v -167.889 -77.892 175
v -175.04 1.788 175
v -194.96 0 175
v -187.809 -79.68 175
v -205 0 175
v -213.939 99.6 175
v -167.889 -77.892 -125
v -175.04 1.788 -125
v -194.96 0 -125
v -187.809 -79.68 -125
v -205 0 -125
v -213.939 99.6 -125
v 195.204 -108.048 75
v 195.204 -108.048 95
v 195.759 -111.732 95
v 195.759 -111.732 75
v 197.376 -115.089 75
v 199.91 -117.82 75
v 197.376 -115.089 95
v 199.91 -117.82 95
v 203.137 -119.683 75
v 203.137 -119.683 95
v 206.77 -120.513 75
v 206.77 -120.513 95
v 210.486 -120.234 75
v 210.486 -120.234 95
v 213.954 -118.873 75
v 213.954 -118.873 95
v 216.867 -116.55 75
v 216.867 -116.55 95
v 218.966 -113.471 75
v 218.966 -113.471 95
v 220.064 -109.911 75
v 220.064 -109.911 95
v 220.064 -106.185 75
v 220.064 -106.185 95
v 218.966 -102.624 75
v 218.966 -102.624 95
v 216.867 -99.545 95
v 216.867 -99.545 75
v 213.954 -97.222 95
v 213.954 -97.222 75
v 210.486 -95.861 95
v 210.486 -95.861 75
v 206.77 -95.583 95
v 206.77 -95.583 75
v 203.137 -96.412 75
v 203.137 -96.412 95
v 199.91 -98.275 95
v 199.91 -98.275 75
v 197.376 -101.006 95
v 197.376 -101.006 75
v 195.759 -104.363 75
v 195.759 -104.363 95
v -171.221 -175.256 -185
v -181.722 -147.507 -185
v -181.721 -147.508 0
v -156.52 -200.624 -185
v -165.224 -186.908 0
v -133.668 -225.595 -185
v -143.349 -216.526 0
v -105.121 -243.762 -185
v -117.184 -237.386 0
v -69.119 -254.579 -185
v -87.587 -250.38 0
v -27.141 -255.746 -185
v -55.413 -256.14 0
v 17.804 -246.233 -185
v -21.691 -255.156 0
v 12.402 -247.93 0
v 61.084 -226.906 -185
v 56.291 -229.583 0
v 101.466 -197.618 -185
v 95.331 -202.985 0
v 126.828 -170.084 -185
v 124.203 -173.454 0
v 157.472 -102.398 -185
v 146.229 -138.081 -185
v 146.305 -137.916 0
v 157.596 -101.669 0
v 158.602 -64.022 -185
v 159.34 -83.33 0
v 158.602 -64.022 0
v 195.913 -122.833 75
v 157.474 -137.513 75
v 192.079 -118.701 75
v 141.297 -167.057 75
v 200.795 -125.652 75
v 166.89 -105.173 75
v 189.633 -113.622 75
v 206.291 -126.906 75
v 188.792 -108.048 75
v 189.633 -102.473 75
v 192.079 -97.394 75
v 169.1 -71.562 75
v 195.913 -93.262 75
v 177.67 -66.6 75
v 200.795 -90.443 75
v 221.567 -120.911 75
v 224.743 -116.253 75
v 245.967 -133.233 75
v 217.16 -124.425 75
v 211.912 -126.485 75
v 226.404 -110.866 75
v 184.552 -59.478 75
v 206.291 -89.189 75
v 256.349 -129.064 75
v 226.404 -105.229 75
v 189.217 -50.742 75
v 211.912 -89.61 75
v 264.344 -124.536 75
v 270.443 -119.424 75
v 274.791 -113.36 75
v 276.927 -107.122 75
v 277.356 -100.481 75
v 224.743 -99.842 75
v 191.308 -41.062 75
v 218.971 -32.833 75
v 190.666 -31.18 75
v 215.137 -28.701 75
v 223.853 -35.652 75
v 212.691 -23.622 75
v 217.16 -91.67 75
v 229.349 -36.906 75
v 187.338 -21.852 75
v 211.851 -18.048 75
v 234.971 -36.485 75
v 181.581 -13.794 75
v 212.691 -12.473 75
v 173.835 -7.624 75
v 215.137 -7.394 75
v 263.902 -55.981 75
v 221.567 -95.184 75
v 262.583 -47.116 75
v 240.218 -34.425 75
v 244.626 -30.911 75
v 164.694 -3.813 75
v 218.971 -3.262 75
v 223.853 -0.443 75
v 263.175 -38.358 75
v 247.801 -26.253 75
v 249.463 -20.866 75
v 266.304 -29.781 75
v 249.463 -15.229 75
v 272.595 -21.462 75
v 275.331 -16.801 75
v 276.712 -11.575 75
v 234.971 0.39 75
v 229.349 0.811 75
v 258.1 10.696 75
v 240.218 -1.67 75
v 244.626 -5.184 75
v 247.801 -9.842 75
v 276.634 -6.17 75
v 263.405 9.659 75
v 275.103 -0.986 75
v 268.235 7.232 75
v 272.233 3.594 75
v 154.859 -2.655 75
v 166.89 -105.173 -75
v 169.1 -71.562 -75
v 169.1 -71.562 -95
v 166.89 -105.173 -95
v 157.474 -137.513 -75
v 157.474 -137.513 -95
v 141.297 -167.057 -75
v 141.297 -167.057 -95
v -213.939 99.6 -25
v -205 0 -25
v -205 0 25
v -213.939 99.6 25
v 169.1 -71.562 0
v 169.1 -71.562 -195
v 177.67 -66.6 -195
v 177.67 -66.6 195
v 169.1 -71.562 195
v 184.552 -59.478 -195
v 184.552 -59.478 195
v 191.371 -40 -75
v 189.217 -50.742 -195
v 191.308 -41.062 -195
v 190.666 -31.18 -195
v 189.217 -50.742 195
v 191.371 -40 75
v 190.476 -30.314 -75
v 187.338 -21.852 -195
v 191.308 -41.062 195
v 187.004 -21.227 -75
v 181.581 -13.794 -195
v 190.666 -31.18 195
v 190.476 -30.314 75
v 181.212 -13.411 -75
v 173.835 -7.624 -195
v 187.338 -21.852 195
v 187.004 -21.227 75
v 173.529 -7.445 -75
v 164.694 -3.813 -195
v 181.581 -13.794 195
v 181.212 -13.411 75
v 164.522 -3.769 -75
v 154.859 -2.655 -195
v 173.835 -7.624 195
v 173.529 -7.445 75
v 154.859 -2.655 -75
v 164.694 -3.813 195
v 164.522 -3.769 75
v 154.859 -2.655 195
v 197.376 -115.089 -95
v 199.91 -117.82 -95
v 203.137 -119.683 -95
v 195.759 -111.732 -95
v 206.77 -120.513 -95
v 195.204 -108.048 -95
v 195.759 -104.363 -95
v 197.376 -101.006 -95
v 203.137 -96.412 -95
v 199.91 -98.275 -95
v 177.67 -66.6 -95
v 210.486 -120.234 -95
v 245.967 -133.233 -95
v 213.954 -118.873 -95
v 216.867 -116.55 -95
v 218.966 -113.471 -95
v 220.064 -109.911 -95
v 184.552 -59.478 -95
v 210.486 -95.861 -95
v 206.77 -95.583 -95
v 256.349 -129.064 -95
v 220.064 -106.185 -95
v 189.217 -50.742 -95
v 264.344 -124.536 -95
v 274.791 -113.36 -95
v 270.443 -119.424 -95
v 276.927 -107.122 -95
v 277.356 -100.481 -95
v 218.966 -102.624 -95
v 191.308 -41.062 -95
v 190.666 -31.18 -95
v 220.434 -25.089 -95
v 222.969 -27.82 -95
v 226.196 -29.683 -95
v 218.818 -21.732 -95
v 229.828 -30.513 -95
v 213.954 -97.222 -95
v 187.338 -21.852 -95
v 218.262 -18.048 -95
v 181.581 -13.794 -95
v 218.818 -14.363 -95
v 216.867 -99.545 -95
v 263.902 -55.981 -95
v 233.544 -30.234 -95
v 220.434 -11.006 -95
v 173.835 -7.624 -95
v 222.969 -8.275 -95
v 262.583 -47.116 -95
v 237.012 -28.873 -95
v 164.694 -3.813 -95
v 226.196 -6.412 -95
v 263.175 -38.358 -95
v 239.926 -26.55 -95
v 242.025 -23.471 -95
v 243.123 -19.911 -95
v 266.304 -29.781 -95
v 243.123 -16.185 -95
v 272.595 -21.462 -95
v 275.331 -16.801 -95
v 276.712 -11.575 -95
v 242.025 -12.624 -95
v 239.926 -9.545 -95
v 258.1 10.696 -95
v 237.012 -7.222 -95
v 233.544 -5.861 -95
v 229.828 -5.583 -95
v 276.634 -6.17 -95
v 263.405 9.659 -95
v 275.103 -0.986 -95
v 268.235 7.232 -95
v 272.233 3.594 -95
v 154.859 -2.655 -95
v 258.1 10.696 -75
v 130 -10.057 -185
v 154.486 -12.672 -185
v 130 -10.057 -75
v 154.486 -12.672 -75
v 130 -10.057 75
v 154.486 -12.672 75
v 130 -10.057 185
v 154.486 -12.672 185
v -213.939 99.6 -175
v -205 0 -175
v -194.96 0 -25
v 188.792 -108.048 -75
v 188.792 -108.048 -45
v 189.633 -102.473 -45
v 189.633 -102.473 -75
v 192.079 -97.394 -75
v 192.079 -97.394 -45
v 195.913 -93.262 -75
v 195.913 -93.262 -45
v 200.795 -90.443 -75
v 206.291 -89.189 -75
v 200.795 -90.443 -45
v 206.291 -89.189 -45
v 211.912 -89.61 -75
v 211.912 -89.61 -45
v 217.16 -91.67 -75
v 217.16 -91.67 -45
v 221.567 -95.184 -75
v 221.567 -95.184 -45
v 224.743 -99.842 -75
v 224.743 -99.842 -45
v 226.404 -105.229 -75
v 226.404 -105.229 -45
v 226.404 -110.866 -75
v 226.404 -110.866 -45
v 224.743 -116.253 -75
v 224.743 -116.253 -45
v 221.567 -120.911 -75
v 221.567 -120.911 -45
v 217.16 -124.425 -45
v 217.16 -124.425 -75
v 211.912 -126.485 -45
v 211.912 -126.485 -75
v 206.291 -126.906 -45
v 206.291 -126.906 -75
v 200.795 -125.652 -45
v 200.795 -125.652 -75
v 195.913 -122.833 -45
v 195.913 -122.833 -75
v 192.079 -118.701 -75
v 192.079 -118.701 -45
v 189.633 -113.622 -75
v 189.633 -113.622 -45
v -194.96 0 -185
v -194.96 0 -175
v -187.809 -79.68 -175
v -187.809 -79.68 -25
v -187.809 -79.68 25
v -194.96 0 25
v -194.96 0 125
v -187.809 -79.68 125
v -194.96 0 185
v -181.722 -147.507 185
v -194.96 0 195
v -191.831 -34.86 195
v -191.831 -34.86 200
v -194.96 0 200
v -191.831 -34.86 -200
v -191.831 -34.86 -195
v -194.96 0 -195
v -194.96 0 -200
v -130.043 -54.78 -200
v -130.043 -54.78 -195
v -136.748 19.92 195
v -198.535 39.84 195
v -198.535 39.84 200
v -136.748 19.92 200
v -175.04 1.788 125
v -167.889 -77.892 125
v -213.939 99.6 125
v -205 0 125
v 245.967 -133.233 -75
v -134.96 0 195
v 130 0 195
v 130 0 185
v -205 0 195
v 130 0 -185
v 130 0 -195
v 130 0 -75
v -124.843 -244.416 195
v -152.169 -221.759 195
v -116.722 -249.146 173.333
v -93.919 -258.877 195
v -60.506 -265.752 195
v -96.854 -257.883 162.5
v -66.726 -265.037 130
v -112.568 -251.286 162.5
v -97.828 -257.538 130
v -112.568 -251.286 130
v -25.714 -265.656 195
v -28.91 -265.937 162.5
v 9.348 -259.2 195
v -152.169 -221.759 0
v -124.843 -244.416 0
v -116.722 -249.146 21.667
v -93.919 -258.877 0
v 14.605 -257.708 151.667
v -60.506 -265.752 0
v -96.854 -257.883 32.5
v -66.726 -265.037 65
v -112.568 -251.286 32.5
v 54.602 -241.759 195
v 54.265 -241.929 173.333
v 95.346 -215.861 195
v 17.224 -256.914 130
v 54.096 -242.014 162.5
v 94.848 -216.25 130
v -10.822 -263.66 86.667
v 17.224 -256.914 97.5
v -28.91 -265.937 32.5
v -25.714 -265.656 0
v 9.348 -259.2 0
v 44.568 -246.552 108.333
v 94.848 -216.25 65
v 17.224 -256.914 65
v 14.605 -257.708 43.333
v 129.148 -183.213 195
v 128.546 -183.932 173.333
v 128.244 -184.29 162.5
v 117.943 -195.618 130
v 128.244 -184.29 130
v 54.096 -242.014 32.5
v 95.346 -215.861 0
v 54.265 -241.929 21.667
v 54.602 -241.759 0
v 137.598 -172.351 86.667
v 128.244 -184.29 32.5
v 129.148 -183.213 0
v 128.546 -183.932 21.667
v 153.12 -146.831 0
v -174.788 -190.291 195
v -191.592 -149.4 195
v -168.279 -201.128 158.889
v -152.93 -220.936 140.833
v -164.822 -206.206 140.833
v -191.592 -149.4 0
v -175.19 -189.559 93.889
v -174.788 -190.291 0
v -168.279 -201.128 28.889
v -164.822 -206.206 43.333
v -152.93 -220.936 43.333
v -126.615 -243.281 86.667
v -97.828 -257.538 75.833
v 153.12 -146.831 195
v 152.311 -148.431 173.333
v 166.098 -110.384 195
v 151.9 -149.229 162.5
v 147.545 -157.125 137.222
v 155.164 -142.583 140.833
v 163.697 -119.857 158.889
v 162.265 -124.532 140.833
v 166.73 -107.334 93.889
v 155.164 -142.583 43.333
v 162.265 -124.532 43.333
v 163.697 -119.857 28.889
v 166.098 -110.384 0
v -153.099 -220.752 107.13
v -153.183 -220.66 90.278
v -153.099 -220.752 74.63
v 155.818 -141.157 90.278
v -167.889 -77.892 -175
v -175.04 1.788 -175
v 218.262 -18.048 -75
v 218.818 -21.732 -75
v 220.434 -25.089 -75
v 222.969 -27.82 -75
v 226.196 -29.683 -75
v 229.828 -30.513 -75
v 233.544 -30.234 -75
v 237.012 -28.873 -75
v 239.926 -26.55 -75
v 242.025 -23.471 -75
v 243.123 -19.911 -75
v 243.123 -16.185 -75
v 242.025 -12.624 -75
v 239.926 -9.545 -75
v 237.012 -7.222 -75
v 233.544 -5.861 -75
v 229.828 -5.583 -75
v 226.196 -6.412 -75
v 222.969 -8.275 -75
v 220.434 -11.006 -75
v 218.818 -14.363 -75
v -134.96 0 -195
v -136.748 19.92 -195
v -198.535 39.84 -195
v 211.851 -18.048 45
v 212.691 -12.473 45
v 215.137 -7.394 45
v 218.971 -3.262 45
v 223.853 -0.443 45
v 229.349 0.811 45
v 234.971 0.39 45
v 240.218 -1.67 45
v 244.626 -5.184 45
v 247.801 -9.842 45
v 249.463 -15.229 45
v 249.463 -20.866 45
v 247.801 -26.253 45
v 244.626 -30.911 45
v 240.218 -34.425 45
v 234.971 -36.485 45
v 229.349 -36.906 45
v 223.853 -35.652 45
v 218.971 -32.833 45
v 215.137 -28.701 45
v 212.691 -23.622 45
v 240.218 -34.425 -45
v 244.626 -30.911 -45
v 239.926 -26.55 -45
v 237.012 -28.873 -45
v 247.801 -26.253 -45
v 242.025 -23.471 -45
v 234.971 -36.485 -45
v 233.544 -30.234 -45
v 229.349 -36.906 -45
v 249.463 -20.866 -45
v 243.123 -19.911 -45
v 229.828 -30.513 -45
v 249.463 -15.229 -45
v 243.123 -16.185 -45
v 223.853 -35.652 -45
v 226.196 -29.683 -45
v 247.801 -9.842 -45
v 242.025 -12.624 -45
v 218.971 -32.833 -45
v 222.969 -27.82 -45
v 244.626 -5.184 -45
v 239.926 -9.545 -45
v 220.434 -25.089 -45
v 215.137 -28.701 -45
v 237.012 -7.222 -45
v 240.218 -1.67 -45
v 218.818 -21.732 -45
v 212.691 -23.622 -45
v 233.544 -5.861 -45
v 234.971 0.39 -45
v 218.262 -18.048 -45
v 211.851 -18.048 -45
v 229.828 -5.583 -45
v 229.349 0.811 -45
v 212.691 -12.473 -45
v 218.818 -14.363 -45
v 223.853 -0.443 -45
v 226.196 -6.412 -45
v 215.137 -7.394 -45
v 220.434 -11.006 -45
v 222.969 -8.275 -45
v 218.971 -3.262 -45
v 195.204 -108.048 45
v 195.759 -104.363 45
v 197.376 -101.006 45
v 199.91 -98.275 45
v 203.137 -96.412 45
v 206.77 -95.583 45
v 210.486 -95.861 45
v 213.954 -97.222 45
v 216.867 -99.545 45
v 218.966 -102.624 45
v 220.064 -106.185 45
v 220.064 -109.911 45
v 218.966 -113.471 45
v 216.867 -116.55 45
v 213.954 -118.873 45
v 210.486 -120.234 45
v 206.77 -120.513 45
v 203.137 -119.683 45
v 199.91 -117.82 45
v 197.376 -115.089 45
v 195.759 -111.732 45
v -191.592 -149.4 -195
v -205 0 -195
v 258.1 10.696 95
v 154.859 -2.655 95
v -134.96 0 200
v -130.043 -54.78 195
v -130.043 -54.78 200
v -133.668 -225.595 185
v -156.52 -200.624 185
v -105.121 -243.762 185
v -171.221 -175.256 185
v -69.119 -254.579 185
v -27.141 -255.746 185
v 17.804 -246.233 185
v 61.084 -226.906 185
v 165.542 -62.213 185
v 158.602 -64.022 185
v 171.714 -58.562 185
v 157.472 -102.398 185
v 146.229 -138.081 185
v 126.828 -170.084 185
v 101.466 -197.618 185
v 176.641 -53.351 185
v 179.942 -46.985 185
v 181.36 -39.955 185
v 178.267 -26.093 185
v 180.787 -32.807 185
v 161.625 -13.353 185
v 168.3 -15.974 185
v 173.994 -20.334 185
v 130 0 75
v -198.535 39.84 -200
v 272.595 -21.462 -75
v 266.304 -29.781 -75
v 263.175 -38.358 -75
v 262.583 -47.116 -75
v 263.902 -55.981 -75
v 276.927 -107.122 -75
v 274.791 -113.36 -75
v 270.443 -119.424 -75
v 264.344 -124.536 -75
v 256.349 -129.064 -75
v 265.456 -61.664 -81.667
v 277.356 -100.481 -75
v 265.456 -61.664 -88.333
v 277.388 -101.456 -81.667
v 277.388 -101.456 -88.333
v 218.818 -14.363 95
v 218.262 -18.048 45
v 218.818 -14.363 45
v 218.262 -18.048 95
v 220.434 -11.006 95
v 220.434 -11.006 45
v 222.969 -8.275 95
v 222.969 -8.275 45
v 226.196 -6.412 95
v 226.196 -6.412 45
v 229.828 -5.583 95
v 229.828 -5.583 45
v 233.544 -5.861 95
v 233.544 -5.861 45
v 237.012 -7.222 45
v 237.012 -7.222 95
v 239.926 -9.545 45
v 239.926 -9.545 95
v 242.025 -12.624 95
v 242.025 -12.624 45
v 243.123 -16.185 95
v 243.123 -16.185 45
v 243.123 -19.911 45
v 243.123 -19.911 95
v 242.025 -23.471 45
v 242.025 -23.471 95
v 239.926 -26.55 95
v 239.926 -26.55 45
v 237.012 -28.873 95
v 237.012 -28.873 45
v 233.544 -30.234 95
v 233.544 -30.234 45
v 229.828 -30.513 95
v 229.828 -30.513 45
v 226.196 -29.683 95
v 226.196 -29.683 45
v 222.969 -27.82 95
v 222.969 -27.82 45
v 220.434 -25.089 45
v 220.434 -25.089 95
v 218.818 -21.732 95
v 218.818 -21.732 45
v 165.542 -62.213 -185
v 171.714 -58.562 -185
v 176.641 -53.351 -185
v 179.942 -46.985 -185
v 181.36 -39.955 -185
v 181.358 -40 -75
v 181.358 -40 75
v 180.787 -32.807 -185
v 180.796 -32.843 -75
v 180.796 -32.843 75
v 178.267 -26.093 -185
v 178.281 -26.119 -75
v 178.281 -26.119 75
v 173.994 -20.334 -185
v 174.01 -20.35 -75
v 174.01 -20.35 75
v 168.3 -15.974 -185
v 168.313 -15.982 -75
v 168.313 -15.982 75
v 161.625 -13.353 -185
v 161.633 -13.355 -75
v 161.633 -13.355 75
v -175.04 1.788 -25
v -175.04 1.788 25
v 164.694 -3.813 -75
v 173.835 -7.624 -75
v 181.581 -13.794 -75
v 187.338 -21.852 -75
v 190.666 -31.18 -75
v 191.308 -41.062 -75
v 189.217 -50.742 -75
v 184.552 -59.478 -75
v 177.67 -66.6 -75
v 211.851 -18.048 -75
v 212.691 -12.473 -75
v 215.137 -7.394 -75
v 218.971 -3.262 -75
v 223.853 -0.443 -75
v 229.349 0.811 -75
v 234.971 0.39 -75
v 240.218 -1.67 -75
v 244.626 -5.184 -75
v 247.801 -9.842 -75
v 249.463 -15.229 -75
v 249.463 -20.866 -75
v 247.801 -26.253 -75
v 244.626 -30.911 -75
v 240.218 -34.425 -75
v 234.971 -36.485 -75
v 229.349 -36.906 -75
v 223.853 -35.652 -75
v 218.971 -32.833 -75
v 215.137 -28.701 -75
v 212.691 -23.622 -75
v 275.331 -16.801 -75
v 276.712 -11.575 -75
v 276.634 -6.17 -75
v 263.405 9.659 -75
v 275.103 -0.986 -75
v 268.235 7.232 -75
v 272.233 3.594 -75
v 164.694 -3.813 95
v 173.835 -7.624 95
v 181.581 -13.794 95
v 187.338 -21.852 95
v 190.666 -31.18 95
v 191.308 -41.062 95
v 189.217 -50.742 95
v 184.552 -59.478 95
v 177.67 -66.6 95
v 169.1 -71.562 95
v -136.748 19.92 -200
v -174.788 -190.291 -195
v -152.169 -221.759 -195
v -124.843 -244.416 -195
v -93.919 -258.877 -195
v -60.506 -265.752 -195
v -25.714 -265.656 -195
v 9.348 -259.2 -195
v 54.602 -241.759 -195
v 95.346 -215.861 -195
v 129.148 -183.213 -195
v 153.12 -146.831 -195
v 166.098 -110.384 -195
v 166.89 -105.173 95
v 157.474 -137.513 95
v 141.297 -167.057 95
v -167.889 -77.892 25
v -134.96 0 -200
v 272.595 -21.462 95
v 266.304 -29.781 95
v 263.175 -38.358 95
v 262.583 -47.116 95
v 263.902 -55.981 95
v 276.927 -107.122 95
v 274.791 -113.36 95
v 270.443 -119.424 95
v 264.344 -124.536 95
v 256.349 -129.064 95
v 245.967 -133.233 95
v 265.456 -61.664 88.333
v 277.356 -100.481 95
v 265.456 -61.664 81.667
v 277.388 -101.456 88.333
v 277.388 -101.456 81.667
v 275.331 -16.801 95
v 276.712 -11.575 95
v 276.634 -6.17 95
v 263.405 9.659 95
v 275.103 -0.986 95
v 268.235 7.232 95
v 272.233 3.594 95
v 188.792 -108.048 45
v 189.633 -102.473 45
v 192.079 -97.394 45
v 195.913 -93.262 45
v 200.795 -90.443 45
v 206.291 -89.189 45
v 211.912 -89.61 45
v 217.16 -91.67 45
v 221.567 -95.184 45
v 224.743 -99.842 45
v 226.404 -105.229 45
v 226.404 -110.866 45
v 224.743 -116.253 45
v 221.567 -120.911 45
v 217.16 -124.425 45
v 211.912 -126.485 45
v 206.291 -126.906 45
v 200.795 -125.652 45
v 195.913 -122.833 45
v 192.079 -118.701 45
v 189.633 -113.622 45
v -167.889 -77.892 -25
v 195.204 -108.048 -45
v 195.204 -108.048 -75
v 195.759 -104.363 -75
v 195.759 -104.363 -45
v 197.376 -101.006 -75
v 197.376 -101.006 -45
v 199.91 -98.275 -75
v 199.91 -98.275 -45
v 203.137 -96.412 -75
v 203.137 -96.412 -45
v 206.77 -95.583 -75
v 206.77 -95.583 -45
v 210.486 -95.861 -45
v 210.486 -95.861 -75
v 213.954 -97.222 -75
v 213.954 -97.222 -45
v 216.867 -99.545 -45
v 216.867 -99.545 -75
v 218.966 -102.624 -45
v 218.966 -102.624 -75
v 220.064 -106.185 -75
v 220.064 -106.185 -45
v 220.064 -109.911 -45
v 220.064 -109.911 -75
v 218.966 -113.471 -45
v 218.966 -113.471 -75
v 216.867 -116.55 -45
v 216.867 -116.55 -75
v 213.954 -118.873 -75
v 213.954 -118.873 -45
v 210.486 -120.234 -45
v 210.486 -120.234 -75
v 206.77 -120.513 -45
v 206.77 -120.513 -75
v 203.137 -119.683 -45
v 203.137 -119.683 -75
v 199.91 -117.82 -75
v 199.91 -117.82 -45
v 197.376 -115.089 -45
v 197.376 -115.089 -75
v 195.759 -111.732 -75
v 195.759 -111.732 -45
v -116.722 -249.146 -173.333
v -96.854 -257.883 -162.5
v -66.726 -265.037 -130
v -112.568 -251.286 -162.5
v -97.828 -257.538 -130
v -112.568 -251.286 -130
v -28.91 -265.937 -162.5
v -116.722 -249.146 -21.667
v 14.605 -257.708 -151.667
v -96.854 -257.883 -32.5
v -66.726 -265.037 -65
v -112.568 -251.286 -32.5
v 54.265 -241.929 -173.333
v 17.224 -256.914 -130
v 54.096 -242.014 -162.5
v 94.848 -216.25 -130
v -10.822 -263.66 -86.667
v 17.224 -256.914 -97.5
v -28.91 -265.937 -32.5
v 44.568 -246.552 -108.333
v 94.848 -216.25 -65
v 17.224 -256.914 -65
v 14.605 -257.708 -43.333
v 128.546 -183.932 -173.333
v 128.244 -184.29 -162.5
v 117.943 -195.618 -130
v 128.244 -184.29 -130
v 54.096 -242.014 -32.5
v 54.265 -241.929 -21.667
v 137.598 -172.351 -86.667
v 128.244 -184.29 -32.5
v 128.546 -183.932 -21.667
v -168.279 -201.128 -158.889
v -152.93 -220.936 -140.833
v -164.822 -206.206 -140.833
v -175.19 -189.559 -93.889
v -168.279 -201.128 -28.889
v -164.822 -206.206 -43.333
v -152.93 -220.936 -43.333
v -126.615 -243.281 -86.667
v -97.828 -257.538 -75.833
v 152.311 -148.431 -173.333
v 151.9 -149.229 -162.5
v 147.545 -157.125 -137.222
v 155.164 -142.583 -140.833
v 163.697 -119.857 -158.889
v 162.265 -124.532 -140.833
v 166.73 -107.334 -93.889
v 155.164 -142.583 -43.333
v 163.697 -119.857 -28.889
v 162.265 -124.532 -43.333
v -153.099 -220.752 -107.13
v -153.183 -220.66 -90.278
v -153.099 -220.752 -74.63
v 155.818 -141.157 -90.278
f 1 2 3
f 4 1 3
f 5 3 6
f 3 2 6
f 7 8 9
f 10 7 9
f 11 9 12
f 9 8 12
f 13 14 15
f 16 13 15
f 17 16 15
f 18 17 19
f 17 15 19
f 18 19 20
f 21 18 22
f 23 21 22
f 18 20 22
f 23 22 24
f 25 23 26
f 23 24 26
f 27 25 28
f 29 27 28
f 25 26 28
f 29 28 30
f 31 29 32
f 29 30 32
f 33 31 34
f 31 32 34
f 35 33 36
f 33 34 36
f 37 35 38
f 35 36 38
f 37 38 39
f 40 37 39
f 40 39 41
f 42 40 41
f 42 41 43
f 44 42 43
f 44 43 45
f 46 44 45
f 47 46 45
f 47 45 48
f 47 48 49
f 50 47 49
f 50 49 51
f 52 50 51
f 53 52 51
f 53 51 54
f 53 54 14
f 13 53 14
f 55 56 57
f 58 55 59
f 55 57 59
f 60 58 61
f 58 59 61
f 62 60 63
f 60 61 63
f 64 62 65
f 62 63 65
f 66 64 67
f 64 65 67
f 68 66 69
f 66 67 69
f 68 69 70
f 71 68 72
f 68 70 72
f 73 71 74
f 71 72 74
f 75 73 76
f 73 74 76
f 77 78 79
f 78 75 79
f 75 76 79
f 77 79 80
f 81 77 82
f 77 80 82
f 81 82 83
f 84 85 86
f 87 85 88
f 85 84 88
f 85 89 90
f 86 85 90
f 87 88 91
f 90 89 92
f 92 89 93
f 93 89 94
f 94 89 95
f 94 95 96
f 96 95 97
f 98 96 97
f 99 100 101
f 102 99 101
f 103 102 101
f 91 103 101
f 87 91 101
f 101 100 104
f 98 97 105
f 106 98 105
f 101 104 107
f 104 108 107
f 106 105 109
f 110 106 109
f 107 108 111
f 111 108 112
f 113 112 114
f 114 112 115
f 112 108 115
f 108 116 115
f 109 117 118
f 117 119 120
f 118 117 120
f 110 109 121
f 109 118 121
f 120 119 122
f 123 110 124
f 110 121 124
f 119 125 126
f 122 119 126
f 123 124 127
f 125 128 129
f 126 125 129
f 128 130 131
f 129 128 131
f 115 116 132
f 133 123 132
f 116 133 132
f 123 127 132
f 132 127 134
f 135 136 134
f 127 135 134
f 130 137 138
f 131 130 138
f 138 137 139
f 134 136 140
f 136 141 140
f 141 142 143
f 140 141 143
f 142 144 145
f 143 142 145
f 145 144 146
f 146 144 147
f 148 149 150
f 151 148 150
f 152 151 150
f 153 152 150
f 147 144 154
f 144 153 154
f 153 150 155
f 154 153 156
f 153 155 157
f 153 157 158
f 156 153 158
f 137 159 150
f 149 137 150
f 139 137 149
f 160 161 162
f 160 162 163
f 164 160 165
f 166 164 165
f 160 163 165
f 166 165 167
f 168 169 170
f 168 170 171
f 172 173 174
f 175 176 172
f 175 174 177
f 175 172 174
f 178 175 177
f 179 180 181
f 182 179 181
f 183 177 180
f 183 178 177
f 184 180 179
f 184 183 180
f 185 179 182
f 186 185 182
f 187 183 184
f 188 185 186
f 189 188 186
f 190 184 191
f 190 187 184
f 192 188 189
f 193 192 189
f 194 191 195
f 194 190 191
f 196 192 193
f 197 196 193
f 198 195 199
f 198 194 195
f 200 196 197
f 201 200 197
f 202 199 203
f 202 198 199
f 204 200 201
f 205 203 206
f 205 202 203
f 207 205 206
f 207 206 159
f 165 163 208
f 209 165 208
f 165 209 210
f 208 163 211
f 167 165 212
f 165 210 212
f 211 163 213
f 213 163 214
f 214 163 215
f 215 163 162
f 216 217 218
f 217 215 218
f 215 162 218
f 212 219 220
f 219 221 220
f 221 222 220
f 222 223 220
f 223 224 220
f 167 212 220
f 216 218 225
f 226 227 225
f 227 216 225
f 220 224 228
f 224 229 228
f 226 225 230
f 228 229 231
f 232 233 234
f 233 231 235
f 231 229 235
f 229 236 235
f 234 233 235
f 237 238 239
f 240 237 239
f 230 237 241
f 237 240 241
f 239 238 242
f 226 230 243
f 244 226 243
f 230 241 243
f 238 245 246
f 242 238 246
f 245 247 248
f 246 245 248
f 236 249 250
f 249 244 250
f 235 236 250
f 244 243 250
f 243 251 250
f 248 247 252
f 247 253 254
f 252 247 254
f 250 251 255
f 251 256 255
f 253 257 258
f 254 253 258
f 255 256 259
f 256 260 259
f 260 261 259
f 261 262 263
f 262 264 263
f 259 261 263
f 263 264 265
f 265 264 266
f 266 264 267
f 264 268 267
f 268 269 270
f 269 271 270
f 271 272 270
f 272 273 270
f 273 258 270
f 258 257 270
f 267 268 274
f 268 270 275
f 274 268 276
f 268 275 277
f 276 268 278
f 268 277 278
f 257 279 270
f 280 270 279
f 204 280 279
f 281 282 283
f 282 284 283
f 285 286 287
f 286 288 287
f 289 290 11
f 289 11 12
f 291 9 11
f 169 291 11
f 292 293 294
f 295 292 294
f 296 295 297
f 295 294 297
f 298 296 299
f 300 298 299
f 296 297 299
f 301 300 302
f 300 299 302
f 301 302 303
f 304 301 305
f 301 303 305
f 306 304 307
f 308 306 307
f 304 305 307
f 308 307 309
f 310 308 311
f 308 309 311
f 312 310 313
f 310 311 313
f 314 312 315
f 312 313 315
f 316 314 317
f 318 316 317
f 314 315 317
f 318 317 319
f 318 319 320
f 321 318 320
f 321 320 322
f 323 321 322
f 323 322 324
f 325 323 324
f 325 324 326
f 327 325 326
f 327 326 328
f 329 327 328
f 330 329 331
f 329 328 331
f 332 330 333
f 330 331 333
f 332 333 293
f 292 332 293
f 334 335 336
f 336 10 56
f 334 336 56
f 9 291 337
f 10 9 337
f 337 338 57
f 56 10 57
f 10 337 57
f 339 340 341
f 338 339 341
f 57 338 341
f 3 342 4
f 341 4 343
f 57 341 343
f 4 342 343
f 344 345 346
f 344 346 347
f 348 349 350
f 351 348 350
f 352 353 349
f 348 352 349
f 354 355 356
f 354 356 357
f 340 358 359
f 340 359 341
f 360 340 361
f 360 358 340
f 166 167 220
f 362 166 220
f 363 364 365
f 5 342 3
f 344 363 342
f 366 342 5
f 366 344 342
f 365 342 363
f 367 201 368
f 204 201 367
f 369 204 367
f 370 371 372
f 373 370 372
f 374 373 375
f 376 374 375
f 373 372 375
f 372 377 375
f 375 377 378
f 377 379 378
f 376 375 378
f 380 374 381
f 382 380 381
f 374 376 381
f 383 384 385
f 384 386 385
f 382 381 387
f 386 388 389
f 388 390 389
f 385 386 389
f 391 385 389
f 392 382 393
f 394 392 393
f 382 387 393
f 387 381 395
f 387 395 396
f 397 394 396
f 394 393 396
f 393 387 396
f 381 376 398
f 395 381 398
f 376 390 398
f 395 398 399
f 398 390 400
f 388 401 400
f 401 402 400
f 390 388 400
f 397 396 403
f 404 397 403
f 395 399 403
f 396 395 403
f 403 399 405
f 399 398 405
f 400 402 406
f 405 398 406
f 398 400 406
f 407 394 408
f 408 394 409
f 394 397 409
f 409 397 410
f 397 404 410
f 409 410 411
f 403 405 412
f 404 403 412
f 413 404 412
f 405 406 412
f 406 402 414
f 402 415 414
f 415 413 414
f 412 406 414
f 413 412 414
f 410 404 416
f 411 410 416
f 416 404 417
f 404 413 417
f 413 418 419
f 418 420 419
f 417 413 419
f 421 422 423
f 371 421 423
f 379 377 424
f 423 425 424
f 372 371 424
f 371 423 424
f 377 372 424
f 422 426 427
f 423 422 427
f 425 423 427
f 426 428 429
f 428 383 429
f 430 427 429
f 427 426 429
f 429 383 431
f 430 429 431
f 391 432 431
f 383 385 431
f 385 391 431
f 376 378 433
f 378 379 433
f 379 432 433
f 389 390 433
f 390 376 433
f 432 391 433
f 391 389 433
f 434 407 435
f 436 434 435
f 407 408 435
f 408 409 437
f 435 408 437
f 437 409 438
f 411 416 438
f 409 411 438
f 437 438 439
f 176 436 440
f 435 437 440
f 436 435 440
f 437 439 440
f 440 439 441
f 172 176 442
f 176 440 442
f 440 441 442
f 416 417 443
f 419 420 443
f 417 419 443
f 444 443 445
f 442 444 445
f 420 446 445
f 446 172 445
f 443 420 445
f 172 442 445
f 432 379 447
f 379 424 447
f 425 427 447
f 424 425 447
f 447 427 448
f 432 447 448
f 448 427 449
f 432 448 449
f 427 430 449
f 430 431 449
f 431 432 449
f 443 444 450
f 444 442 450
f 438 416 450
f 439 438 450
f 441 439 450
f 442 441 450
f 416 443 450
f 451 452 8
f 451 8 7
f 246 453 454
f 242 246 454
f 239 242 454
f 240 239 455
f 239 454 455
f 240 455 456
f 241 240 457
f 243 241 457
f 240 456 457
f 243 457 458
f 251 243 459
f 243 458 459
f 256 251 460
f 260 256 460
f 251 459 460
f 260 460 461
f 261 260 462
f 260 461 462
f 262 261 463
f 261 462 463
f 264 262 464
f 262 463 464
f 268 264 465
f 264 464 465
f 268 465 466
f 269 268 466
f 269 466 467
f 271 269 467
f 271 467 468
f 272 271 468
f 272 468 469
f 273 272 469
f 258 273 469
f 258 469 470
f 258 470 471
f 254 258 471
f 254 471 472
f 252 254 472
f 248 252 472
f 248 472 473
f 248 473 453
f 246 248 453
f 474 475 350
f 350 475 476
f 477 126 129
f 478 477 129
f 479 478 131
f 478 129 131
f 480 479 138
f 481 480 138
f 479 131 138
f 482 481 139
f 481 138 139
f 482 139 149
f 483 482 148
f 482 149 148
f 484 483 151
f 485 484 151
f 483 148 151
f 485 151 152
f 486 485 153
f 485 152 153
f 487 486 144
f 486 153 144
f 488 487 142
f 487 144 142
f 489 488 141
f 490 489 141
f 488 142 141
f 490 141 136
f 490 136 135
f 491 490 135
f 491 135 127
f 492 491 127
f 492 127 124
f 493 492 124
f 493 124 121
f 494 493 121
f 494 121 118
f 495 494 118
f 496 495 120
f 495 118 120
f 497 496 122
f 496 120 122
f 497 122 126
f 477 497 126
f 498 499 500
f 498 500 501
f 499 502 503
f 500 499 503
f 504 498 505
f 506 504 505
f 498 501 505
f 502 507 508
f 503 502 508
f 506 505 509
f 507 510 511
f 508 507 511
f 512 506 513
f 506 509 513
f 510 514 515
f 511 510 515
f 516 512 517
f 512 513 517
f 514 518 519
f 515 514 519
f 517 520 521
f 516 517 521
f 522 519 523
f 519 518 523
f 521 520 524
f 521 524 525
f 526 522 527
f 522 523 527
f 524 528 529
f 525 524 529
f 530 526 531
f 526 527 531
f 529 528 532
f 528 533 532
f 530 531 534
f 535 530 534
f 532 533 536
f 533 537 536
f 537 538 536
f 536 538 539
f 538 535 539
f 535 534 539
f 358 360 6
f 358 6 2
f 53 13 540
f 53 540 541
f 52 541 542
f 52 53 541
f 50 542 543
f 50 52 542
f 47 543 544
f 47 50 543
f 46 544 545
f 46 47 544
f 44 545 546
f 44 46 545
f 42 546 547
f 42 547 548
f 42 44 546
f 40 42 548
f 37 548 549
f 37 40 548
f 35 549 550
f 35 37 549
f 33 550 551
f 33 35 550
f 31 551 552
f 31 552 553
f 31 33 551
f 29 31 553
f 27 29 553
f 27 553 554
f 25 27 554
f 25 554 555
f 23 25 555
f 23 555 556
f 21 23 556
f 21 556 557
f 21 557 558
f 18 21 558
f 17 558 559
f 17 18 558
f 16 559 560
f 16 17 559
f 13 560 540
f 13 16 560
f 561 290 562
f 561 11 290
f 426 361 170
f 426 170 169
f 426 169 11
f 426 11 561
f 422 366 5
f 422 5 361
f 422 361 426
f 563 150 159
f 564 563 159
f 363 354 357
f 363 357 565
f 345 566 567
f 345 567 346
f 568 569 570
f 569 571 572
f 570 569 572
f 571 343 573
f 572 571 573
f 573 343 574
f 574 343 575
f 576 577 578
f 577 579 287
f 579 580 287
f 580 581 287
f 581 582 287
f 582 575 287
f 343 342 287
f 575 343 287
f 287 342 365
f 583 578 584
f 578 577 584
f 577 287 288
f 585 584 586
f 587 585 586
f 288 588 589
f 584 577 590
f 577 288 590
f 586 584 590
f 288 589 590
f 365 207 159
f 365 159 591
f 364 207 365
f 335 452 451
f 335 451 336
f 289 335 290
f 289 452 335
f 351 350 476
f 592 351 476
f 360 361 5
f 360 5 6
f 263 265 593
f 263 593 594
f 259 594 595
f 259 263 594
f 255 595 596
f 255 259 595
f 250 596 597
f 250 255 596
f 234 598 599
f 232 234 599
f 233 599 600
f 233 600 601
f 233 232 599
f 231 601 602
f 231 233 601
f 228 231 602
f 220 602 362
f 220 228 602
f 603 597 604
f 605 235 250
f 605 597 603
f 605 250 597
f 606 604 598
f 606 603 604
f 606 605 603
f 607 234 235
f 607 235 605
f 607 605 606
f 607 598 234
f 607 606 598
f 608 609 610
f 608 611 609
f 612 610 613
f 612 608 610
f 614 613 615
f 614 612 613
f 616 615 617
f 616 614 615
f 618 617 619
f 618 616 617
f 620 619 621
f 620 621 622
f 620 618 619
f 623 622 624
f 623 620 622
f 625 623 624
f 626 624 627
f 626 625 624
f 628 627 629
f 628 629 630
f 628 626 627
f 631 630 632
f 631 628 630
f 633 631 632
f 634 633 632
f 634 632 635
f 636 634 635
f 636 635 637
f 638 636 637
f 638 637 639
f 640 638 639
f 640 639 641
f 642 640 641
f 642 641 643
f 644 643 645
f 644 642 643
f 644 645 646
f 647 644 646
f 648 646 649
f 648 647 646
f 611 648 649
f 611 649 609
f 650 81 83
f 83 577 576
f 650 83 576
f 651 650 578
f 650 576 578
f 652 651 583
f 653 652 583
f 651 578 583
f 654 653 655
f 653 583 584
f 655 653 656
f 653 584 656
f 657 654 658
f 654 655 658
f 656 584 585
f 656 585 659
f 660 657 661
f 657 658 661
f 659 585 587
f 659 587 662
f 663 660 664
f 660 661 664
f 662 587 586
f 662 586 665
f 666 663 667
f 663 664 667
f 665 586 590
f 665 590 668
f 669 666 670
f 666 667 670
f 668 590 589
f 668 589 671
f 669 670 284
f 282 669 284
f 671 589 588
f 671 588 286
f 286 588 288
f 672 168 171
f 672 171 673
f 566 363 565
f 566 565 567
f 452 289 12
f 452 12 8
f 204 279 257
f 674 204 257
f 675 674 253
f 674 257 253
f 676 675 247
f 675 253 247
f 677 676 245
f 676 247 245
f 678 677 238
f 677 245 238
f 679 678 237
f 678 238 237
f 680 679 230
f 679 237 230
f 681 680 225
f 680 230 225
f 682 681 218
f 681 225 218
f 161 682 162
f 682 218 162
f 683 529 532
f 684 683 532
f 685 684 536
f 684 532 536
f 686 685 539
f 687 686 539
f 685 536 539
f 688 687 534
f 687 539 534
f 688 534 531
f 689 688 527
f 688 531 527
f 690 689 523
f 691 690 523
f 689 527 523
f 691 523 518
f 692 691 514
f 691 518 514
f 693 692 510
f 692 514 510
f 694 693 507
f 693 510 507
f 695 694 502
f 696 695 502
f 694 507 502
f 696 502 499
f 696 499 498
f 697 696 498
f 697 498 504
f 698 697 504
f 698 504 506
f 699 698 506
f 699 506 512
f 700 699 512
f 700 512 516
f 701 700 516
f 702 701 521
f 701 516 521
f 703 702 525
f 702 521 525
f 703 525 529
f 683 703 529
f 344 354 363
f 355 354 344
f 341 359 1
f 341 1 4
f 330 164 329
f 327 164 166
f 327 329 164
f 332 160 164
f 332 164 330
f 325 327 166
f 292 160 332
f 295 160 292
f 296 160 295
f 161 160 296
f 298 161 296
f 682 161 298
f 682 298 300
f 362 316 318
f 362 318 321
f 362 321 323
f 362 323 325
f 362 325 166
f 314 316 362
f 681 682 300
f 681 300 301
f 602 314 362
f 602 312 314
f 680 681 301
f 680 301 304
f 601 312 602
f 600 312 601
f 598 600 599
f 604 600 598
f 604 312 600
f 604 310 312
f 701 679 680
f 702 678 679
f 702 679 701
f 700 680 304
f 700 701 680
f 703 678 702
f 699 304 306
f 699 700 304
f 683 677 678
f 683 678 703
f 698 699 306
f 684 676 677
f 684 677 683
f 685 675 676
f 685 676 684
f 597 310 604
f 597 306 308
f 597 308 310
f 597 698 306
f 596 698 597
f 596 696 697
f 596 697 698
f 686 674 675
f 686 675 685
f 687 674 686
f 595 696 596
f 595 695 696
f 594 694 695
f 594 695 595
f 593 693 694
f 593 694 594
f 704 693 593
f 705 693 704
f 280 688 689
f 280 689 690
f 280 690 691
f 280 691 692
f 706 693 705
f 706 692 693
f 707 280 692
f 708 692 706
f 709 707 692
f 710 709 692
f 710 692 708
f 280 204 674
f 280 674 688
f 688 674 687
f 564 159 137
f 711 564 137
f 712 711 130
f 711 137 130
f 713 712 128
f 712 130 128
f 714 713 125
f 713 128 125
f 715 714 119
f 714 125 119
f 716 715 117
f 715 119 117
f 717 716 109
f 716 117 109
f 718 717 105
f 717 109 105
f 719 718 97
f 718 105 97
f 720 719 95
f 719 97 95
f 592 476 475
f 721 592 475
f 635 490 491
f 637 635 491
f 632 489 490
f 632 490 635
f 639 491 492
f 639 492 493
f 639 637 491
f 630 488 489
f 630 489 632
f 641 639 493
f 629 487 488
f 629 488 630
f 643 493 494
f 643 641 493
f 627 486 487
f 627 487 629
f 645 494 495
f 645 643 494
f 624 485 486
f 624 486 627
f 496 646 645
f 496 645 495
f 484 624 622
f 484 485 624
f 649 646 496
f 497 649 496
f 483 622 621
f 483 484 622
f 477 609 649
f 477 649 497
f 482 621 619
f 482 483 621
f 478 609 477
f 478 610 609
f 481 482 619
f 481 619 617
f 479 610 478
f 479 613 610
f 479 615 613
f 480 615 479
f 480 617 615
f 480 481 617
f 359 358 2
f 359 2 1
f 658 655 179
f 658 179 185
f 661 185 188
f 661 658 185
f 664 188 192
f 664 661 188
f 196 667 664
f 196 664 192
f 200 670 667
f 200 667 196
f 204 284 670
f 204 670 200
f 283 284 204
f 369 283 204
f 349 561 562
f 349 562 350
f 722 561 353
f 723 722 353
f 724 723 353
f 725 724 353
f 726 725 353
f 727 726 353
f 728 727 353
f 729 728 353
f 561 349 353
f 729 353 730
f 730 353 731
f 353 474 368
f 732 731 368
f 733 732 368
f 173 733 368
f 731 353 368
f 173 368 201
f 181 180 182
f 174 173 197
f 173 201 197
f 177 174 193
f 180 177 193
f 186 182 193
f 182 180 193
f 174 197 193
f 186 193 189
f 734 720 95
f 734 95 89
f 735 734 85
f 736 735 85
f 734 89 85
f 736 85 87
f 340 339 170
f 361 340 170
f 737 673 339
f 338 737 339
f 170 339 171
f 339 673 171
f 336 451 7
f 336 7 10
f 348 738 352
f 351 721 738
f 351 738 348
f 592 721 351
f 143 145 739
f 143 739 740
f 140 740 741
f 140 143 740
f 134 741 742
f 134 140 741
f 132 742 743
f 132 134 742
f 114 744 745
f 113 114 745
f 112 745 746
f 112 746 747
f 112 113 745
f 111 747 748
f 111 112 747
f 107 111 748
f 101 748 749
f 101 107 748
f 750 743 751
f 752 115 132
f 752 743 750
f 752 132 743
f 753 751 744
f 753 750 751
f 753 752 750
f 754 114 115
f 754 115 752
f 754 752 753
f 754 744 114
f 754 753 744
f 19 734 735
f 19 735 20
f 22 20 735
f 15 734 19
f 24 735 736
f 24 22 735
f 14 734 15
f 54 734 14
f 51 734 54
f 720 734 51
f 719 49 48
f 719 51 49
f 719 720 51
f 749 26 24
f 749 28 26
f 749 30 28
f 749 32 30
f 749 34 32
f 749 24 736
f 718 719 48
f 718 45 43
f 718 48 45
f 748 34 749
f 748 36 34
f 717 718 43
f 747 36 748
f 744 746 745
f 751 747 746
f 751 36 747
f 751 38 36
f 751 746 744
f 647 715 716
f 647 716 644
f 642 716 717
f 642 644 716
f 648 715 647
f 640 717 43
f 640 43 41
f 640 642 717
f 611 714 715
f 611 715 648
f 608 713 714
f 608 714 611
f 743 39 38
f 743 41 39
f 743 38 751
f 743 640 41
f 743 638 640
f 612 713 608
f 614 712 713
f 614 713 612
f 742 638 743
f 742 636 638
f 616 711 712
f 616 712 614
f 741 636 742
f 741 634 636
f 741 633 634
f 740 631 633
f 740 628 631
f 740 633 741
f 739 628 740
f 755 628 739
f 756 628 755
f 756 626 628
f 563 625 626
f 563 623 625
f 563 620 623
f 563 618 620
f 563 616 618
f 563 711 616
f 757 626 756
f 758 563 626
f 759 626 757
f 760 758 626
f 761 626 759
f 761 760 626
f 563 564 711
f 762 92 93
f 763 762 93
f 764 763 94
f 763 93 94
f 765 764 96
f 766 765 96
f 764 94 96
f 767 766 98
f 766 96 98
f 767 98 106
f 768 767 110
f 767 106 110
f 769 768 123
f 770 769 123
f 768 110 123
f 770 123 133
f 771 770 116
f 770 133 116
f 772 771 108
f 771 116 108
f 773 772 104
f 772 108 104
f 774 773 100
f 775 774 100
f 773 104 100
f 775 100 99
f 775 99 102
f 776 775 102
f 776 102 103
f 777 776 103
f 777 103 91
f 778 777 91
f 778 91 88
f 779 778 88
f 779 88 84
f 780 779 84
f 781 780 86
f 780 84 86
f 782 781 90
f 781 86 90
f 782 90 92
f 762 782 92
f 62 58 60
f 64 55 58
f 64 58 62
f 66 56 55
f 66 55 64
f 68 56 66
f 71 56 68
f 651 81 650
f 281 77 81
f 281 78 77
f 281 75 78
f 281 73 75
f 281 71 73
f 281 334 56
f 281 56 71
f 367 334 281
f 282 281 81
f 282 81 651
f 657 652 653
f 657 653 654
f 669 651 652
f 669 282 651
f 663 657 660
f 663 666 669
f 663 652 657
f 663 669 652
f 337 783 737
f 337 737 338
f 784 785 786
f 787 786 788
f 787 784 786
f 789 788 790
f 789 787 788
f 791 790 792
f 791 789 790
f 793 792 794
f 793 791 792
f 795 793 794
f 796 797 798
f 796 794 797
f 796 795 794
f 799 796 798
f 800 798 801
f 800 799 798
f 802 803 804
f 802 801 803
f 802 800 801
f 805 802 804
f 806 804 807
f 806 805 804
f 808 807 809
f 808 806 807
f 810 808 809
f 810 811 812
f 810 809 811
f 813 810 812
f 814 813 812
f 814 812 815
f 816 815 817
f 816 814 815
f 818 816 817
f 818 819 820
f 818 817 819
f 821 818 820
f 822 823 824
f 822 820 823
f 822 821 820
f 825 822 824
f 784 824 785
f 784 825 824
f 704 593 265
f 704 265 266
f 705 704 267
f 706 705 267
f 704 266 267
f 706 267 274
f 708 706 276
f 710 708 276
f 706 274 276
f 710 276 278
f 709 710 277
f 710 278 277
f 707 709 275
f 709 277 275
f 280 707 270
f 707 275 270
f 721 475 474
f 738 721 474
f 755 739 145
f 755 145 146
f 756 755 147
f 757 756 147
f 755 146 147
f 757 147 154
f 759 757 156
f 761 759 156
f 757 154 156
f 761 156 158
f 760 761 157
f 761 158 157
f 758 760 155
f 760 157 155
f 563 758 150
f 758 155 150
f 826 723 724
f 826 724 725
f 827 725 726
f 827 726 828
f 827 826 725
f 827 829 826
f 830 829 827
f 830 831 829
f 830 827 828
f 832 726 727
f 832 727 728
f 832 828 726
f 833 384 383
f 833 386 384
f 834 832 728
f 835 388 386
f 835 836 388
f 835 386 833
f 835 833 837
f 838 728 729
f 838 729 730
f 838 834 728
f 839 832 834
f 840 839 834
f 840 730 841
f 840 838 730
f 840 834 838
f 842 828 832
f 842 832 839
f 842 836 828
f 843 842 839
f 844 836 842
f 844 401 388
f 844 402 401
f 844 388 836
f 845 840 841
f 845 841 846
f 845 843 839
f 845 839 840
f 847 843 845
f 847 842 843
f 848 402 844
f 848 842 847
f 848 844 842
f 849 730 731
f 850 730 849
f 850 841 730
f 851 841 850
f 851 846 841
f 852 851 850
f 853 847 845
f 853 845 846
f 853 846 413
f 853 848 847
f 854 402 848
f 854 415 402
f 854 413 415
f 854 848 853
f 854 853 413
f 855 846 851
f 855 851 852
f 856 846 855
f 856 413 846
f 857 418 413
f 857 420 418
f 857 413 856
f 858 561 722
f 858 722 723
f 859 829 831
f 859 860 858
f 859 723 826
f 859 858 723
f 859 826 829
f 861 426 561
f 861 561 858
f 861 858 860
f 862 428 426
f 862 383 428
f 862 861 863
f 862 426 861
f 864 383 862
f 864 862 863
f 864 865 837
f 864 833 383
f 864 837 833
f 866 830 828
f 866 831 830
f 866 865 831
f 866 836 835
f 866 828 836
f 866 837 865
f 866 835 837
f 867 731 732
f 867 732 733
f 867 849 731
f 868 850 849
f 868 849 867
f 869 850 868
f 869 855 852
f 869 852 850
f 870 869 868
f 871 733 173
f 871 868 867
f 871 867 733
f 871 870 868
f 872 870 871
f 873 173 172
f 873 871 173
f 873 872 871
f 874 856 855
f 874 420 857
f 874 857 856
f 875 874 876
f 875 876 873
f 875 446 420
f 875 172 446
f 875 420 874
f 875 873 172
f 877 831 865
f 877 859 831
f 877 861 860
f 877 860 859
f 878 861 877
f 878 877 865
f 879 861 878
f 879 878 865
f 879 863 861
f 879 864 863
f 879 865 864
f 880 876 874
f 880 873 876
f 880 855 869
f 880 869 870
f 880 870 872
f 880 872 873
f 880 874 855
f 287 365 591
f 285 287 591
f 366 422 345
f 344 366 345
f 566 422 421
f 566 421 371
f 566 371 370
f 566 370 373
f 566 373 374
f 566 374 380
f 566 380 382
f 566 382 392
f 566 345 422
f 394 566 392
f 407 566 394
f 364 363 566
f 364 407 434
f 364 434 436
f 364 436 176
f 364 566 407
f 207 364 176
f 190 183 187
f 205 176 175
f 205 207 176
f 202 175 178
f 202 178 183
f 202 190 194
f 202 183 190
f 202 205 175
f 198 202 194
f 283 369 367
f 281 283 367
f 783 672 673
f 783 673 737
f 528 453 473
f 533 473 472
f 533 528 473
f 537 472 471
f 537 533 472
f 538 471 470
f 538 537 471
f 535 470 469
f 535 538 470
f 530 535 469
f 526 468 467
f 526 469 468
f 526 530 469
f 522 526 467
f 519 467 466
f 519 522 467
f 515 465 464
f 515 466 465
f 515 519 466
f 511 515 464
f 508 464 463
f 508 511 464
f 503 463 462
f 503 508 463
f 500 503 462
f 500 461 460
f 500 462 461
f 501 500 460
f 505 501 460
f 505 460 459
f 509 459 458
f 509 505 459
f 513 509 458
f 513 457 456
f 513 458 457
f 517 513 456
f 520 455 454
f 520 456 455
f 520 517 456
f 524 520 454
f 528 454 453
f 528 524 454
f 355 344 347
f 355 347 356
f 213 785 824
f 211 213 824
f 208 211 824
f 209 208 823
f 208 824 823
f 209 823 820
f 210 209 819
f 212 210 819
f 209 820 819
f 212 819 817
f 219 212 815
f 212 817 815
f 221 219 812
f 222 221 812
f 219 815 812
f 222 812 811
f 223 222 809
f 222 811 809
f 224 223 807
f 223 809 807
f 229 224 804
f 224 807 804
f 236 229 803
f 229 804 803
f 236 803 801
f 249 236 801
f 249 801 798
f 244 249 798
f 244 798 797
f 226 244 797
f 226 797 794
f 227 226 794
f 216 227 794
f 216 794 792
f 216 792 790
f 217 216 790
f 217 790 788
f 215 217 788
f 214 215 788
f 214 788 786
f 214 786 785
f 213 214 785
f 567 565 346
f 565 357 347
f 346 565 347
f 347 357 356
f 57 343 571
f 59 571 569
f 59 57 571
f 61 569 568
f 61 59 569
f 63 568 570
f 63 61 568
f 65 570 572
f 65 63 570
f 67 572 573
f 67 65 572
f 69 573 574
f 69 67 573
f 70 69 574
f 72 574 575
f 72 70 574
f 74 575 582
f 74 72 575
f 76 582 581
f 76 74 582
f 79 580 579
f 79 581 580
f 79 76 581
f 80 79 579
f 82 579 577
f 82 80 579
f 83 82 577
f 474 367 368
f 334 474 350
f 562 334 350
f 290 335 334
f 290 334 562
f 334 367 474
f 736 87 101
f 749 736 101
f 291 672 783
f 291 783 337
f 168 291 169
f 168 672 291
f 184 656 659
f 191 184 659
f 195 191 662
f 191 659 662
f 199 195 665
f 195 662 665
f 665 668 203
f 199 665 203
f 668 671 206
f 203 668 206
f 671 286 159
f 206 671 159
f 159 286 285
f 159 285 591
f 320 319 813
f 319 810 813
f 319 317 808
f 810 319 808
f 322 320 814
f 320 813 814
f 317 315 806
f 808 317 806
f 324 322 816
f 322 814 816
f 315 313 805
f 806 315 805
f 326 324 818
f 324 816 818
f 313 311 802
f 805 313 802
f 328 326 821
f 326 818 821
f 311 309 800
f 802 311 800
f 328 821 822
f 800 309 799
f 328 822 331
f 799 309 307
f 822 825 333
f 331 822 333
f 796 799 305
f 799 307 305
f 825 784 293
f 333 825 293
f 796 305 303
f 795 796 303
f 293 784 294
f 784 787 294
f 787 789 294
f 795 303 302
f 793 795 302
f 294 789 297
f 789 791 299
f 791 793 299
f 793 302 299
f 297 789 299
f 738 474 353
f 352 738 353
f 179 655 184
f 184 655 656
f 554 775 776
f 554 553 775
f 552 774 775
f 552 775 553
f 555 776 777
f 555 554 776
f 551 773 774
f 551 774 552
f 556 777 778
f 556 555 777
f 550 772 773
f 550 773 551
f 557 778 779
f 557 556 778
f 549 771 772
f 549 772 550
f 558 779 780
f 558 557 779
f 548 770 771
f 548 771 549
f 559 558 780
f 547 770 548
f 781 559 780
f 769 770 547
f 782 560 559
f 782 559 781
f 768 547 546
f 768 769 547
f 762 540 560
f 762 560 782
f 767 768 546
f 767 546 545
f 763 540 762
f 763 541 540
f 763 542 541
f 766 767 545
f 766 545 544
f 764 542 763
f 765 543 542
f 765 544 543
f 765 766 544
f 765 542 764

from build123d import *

# Parameters (mm, degrees)
BASIC_GEOMETRY_DEPTH   = 195
REMOVE_MATERIAL_T      = -10
TEETH_START            = 10
TEETH_DEPTH            = 50
SKETCH2_W              = 94.171868374
SKETCH2_H              = 370
REMOVE_MATERIAL2_DEPTH = 50
TEETH_PATTERN_COUNT    = 3
TEETH_PATTERN_PITCH    = 150
SIDE_PLATE_DEPTH       = 5
BOSS_EXTRUDE6_START    = 75
BOSS_EXTRUDE6_DEPTH    = 20
LPATTERN4_COUNT        = 2
LPATTERN4_PITCH        = 170
SKETCH10_R             = 12.5
CUT_EXTRUDE4_DEPTH     = 485.783096914
SKETCH11_R             = 18.911522993
SKETCH11_R_2           = 12.5
BOSS_EXTRUDE7_DEPTH    = 30
LPATTERN7_COUNT        = 2
LPATTERN7_PITCH        = 120
SKETCH13_W             = 150
SKETCH13_H             = 40
CUT_EXTRUDE5_DEPTH     = 70


with BuildPart() as part:
    # Sketch1 → Basic_geometry (new, symmetric)
    with BuildSketch(Plane.XY):
        with BuildLine():
            Line((130, 0), (-130, 0))
            Line((-130, 0), (-205, 0))
            Line((-205, 0), (-191.591883356, -149.399539518))
            add(Edge.make_bspline(
                [(-191.591883356, -149.399539518), (-126.425268405, -370.090746117), (179.854093021, -241.359443475), (169.099924805, -71.562234879)],
                knots=[0, 0, 0, 0, 1, 1, 1, 1], degree=3))
            ThreePointArc((169.099924805, -71.562234879), (190.665817888, -31.179766144), (154.858649571, -2.654720612))
            Line((154.858649571, -2.654720612), (130, 0))
        make_face()
    extrude(amount=BASIC_GEOMETRY_DEPTH, both=True)

    # Remove_material
    remove_material_openings = [part.faces().sort_by_distance(p)[0] for p in [
        (-37.5, 0, 0),
    ]]
    offset(amount=REMOVE_MATERIAL_T, openings=remove_material_openings, kind=Kind.INTERSECTION)

    # Sketch7 → Teeth (add)
    with BuildSketch(Plane.XY.offset(-185).offset(TEETH_START)):
        Polygon((-205, 0), (-213.938744429, 99.599693012), (-175.039869809, 1.787748886), (-167.888874266, -77.892005523), (-187.808812868, -79.679754409), (-194.959808411, 0), align=None)
    teeth = extrude(amount=TEETH_DEPTH)

    # Sketch2 → Remove_material2 (cut)
    with BuildSketch(Plane(origin=(0, 0, 0), x_dir=(1, 0, 0), z_dir=(0, 1, 0))):
        with Locations((82.914065813, 0)):
            Rectangle(SKETCH2_W, SKETCH2_H)
    extrude(amount=-REMOVE_MATERIAL2_DEPTH, mode=Mode.SUBTRACT)

    # Teeth_pattern: Teeth ×3
    with Locations(*[(0, 0, i * TEETH_PATTERN_PITCH) for i in range(1, TEETH_PATTERN_COUNT)]):
        add(teeth)

    # Sketch8 → Side_plate (add)
    with BuildSketch(Plane.XY.offset(195)):
        Polygon((-194.959808411, 0), (-198.535306183, 39.839877205), (-136.747557297, 19.919938602), (-134.959808411, 0), (-130.043498975, -54.779831156), (-191.831247861, -34.859892554), align=None)
    side_plate = extrude(amount=SIDE_PLATE_DEPTH)

    # Side_plate_mirror: Side_plate across plane
    add(side_plate.mirror(Plane.XY))

    # Sketch13 → Cut-Extrude5 (cut)
    with BuildSketch(Plane.ZY.offset(-130)):
        with Locations((0, -20)):
            Rectangle(SKETCH13_W, SKETCH13_H)
    extrude(amount=-CUT_EXTRUDE5_DEPTH, mode=Mode.SUBTRACT)


with BuildPart() as body_2:
    # Sketch9 → Boss-Extrude6 (new body)
    with BuildSketch(Plane.XY.offset(BOSS_EXTRUDE6_START)):
        with BuildLine():
            Line((141.296742224, -167.057120142), (245.967438276, -133.233380134))
            add(Edge.make_bspline(
                [(272.594670811, -21.462325491), (235.113232038, -59.333448742), (319.872555968, -107.999027182), (245.967438276, -133.233380134)],
                knots=[0, 0, 0, 0, 1, 1, 1, 1], degree=3))
            ThreePointArc((272.594670811, -21.462325491), (275.102934155, -0.986118764), (258.099927413, 10.695669998))
            Line((258.099927413, 10.695669998), (154.858649571, -2.654720612))
            ThreePointArc((154.858649571, -2.654720612), (190.665817888, -31.179766144), (169.099924805, -71.562234879))
            ThreePointArc((169.099924805, -71.562234879), (163.062439638, -121.599299387), (141.296742224, -167.057120142))
        make_face()
    boss_extrude6 = extrude(amount=BOSS_EXTRUDE6_DEPTH)


with BuildPart() as lpattern4_1:
    # LPattern4: Boss-Extrude6 ×2
    with Locations(*[(0, 0, -i * LPATTERN4_PITCH) for i in range(1, LPATTERN4_COUNT)]):
        add(boss_extrude6)


with BuildPart() as cut_extrude4_tool:
    # Sketch10 → Cut-Extrude4 (new, through all)
    with BuildSketch(Plane.XY.offset(95)):
        with Locations(Location((230.762415937, -18.047567767, 0), (0, 0, 180))):
            Circle(SKETCH10_R)
        with Locations(Location((207.704013235, -108.047567767, 0), (0, 0, 180))):
            Circle(SKETCH10_R)
    extrude(amount=-CUT_EXTRUDE4_DEPTH)


with BuildPart() as body_2_1:
    add(body_2.part)

    # Cut-Extrude4: cut by cut_extrude4_tool
    add(cut_extrude4_tool.part, mode=Mode.SUBTRACT)

    # Sketch11 → Boss-Extrude7 (add)
    with BuildSketch(Plane(origin=(0, 0, 75), x_dir=(-1, 0, 0), z_dir=(0, 0, -1))):
        with Locations((-230.762415937, -18.047567767)):
            Circle(SKETCH11_R)
        with Locations((-230.762415937, -18.047567767)):
            Circle(SKETCH11_R_2, mode=Mode.SUBTRACT)
        with Locations((-207.704013235, -108.047567767)):
            Circle(SKETCH11_R)
        with Locations((-207.704013235, -108.047567767)):
            Circle(SKETCH11_R_2, mode=Mode.SUBTRACT)
    boss_extrude7 = extrude(amount=BOSS_EXTRUDE7_DEPTH)


with BuildPart() as lpattern4_1_1:
    add(lpattern4_1.part)

    # Cut-Extrude4: cut by cut_extrude4_tool
    add(cut_extrude4_tool.part, mode=Mode.SUBTRACT)

    # LPattern7: Boss-Extrude7 ×2
    with Locations(*[(0, 0, -i * LPATTERN7_PITCH) for i in range(1, LPATTERN7_COUNT)]):
        add(boss_extrude7)


solid = Compound([part.part, body_2_1.part, lpattern4_1_1.part])
